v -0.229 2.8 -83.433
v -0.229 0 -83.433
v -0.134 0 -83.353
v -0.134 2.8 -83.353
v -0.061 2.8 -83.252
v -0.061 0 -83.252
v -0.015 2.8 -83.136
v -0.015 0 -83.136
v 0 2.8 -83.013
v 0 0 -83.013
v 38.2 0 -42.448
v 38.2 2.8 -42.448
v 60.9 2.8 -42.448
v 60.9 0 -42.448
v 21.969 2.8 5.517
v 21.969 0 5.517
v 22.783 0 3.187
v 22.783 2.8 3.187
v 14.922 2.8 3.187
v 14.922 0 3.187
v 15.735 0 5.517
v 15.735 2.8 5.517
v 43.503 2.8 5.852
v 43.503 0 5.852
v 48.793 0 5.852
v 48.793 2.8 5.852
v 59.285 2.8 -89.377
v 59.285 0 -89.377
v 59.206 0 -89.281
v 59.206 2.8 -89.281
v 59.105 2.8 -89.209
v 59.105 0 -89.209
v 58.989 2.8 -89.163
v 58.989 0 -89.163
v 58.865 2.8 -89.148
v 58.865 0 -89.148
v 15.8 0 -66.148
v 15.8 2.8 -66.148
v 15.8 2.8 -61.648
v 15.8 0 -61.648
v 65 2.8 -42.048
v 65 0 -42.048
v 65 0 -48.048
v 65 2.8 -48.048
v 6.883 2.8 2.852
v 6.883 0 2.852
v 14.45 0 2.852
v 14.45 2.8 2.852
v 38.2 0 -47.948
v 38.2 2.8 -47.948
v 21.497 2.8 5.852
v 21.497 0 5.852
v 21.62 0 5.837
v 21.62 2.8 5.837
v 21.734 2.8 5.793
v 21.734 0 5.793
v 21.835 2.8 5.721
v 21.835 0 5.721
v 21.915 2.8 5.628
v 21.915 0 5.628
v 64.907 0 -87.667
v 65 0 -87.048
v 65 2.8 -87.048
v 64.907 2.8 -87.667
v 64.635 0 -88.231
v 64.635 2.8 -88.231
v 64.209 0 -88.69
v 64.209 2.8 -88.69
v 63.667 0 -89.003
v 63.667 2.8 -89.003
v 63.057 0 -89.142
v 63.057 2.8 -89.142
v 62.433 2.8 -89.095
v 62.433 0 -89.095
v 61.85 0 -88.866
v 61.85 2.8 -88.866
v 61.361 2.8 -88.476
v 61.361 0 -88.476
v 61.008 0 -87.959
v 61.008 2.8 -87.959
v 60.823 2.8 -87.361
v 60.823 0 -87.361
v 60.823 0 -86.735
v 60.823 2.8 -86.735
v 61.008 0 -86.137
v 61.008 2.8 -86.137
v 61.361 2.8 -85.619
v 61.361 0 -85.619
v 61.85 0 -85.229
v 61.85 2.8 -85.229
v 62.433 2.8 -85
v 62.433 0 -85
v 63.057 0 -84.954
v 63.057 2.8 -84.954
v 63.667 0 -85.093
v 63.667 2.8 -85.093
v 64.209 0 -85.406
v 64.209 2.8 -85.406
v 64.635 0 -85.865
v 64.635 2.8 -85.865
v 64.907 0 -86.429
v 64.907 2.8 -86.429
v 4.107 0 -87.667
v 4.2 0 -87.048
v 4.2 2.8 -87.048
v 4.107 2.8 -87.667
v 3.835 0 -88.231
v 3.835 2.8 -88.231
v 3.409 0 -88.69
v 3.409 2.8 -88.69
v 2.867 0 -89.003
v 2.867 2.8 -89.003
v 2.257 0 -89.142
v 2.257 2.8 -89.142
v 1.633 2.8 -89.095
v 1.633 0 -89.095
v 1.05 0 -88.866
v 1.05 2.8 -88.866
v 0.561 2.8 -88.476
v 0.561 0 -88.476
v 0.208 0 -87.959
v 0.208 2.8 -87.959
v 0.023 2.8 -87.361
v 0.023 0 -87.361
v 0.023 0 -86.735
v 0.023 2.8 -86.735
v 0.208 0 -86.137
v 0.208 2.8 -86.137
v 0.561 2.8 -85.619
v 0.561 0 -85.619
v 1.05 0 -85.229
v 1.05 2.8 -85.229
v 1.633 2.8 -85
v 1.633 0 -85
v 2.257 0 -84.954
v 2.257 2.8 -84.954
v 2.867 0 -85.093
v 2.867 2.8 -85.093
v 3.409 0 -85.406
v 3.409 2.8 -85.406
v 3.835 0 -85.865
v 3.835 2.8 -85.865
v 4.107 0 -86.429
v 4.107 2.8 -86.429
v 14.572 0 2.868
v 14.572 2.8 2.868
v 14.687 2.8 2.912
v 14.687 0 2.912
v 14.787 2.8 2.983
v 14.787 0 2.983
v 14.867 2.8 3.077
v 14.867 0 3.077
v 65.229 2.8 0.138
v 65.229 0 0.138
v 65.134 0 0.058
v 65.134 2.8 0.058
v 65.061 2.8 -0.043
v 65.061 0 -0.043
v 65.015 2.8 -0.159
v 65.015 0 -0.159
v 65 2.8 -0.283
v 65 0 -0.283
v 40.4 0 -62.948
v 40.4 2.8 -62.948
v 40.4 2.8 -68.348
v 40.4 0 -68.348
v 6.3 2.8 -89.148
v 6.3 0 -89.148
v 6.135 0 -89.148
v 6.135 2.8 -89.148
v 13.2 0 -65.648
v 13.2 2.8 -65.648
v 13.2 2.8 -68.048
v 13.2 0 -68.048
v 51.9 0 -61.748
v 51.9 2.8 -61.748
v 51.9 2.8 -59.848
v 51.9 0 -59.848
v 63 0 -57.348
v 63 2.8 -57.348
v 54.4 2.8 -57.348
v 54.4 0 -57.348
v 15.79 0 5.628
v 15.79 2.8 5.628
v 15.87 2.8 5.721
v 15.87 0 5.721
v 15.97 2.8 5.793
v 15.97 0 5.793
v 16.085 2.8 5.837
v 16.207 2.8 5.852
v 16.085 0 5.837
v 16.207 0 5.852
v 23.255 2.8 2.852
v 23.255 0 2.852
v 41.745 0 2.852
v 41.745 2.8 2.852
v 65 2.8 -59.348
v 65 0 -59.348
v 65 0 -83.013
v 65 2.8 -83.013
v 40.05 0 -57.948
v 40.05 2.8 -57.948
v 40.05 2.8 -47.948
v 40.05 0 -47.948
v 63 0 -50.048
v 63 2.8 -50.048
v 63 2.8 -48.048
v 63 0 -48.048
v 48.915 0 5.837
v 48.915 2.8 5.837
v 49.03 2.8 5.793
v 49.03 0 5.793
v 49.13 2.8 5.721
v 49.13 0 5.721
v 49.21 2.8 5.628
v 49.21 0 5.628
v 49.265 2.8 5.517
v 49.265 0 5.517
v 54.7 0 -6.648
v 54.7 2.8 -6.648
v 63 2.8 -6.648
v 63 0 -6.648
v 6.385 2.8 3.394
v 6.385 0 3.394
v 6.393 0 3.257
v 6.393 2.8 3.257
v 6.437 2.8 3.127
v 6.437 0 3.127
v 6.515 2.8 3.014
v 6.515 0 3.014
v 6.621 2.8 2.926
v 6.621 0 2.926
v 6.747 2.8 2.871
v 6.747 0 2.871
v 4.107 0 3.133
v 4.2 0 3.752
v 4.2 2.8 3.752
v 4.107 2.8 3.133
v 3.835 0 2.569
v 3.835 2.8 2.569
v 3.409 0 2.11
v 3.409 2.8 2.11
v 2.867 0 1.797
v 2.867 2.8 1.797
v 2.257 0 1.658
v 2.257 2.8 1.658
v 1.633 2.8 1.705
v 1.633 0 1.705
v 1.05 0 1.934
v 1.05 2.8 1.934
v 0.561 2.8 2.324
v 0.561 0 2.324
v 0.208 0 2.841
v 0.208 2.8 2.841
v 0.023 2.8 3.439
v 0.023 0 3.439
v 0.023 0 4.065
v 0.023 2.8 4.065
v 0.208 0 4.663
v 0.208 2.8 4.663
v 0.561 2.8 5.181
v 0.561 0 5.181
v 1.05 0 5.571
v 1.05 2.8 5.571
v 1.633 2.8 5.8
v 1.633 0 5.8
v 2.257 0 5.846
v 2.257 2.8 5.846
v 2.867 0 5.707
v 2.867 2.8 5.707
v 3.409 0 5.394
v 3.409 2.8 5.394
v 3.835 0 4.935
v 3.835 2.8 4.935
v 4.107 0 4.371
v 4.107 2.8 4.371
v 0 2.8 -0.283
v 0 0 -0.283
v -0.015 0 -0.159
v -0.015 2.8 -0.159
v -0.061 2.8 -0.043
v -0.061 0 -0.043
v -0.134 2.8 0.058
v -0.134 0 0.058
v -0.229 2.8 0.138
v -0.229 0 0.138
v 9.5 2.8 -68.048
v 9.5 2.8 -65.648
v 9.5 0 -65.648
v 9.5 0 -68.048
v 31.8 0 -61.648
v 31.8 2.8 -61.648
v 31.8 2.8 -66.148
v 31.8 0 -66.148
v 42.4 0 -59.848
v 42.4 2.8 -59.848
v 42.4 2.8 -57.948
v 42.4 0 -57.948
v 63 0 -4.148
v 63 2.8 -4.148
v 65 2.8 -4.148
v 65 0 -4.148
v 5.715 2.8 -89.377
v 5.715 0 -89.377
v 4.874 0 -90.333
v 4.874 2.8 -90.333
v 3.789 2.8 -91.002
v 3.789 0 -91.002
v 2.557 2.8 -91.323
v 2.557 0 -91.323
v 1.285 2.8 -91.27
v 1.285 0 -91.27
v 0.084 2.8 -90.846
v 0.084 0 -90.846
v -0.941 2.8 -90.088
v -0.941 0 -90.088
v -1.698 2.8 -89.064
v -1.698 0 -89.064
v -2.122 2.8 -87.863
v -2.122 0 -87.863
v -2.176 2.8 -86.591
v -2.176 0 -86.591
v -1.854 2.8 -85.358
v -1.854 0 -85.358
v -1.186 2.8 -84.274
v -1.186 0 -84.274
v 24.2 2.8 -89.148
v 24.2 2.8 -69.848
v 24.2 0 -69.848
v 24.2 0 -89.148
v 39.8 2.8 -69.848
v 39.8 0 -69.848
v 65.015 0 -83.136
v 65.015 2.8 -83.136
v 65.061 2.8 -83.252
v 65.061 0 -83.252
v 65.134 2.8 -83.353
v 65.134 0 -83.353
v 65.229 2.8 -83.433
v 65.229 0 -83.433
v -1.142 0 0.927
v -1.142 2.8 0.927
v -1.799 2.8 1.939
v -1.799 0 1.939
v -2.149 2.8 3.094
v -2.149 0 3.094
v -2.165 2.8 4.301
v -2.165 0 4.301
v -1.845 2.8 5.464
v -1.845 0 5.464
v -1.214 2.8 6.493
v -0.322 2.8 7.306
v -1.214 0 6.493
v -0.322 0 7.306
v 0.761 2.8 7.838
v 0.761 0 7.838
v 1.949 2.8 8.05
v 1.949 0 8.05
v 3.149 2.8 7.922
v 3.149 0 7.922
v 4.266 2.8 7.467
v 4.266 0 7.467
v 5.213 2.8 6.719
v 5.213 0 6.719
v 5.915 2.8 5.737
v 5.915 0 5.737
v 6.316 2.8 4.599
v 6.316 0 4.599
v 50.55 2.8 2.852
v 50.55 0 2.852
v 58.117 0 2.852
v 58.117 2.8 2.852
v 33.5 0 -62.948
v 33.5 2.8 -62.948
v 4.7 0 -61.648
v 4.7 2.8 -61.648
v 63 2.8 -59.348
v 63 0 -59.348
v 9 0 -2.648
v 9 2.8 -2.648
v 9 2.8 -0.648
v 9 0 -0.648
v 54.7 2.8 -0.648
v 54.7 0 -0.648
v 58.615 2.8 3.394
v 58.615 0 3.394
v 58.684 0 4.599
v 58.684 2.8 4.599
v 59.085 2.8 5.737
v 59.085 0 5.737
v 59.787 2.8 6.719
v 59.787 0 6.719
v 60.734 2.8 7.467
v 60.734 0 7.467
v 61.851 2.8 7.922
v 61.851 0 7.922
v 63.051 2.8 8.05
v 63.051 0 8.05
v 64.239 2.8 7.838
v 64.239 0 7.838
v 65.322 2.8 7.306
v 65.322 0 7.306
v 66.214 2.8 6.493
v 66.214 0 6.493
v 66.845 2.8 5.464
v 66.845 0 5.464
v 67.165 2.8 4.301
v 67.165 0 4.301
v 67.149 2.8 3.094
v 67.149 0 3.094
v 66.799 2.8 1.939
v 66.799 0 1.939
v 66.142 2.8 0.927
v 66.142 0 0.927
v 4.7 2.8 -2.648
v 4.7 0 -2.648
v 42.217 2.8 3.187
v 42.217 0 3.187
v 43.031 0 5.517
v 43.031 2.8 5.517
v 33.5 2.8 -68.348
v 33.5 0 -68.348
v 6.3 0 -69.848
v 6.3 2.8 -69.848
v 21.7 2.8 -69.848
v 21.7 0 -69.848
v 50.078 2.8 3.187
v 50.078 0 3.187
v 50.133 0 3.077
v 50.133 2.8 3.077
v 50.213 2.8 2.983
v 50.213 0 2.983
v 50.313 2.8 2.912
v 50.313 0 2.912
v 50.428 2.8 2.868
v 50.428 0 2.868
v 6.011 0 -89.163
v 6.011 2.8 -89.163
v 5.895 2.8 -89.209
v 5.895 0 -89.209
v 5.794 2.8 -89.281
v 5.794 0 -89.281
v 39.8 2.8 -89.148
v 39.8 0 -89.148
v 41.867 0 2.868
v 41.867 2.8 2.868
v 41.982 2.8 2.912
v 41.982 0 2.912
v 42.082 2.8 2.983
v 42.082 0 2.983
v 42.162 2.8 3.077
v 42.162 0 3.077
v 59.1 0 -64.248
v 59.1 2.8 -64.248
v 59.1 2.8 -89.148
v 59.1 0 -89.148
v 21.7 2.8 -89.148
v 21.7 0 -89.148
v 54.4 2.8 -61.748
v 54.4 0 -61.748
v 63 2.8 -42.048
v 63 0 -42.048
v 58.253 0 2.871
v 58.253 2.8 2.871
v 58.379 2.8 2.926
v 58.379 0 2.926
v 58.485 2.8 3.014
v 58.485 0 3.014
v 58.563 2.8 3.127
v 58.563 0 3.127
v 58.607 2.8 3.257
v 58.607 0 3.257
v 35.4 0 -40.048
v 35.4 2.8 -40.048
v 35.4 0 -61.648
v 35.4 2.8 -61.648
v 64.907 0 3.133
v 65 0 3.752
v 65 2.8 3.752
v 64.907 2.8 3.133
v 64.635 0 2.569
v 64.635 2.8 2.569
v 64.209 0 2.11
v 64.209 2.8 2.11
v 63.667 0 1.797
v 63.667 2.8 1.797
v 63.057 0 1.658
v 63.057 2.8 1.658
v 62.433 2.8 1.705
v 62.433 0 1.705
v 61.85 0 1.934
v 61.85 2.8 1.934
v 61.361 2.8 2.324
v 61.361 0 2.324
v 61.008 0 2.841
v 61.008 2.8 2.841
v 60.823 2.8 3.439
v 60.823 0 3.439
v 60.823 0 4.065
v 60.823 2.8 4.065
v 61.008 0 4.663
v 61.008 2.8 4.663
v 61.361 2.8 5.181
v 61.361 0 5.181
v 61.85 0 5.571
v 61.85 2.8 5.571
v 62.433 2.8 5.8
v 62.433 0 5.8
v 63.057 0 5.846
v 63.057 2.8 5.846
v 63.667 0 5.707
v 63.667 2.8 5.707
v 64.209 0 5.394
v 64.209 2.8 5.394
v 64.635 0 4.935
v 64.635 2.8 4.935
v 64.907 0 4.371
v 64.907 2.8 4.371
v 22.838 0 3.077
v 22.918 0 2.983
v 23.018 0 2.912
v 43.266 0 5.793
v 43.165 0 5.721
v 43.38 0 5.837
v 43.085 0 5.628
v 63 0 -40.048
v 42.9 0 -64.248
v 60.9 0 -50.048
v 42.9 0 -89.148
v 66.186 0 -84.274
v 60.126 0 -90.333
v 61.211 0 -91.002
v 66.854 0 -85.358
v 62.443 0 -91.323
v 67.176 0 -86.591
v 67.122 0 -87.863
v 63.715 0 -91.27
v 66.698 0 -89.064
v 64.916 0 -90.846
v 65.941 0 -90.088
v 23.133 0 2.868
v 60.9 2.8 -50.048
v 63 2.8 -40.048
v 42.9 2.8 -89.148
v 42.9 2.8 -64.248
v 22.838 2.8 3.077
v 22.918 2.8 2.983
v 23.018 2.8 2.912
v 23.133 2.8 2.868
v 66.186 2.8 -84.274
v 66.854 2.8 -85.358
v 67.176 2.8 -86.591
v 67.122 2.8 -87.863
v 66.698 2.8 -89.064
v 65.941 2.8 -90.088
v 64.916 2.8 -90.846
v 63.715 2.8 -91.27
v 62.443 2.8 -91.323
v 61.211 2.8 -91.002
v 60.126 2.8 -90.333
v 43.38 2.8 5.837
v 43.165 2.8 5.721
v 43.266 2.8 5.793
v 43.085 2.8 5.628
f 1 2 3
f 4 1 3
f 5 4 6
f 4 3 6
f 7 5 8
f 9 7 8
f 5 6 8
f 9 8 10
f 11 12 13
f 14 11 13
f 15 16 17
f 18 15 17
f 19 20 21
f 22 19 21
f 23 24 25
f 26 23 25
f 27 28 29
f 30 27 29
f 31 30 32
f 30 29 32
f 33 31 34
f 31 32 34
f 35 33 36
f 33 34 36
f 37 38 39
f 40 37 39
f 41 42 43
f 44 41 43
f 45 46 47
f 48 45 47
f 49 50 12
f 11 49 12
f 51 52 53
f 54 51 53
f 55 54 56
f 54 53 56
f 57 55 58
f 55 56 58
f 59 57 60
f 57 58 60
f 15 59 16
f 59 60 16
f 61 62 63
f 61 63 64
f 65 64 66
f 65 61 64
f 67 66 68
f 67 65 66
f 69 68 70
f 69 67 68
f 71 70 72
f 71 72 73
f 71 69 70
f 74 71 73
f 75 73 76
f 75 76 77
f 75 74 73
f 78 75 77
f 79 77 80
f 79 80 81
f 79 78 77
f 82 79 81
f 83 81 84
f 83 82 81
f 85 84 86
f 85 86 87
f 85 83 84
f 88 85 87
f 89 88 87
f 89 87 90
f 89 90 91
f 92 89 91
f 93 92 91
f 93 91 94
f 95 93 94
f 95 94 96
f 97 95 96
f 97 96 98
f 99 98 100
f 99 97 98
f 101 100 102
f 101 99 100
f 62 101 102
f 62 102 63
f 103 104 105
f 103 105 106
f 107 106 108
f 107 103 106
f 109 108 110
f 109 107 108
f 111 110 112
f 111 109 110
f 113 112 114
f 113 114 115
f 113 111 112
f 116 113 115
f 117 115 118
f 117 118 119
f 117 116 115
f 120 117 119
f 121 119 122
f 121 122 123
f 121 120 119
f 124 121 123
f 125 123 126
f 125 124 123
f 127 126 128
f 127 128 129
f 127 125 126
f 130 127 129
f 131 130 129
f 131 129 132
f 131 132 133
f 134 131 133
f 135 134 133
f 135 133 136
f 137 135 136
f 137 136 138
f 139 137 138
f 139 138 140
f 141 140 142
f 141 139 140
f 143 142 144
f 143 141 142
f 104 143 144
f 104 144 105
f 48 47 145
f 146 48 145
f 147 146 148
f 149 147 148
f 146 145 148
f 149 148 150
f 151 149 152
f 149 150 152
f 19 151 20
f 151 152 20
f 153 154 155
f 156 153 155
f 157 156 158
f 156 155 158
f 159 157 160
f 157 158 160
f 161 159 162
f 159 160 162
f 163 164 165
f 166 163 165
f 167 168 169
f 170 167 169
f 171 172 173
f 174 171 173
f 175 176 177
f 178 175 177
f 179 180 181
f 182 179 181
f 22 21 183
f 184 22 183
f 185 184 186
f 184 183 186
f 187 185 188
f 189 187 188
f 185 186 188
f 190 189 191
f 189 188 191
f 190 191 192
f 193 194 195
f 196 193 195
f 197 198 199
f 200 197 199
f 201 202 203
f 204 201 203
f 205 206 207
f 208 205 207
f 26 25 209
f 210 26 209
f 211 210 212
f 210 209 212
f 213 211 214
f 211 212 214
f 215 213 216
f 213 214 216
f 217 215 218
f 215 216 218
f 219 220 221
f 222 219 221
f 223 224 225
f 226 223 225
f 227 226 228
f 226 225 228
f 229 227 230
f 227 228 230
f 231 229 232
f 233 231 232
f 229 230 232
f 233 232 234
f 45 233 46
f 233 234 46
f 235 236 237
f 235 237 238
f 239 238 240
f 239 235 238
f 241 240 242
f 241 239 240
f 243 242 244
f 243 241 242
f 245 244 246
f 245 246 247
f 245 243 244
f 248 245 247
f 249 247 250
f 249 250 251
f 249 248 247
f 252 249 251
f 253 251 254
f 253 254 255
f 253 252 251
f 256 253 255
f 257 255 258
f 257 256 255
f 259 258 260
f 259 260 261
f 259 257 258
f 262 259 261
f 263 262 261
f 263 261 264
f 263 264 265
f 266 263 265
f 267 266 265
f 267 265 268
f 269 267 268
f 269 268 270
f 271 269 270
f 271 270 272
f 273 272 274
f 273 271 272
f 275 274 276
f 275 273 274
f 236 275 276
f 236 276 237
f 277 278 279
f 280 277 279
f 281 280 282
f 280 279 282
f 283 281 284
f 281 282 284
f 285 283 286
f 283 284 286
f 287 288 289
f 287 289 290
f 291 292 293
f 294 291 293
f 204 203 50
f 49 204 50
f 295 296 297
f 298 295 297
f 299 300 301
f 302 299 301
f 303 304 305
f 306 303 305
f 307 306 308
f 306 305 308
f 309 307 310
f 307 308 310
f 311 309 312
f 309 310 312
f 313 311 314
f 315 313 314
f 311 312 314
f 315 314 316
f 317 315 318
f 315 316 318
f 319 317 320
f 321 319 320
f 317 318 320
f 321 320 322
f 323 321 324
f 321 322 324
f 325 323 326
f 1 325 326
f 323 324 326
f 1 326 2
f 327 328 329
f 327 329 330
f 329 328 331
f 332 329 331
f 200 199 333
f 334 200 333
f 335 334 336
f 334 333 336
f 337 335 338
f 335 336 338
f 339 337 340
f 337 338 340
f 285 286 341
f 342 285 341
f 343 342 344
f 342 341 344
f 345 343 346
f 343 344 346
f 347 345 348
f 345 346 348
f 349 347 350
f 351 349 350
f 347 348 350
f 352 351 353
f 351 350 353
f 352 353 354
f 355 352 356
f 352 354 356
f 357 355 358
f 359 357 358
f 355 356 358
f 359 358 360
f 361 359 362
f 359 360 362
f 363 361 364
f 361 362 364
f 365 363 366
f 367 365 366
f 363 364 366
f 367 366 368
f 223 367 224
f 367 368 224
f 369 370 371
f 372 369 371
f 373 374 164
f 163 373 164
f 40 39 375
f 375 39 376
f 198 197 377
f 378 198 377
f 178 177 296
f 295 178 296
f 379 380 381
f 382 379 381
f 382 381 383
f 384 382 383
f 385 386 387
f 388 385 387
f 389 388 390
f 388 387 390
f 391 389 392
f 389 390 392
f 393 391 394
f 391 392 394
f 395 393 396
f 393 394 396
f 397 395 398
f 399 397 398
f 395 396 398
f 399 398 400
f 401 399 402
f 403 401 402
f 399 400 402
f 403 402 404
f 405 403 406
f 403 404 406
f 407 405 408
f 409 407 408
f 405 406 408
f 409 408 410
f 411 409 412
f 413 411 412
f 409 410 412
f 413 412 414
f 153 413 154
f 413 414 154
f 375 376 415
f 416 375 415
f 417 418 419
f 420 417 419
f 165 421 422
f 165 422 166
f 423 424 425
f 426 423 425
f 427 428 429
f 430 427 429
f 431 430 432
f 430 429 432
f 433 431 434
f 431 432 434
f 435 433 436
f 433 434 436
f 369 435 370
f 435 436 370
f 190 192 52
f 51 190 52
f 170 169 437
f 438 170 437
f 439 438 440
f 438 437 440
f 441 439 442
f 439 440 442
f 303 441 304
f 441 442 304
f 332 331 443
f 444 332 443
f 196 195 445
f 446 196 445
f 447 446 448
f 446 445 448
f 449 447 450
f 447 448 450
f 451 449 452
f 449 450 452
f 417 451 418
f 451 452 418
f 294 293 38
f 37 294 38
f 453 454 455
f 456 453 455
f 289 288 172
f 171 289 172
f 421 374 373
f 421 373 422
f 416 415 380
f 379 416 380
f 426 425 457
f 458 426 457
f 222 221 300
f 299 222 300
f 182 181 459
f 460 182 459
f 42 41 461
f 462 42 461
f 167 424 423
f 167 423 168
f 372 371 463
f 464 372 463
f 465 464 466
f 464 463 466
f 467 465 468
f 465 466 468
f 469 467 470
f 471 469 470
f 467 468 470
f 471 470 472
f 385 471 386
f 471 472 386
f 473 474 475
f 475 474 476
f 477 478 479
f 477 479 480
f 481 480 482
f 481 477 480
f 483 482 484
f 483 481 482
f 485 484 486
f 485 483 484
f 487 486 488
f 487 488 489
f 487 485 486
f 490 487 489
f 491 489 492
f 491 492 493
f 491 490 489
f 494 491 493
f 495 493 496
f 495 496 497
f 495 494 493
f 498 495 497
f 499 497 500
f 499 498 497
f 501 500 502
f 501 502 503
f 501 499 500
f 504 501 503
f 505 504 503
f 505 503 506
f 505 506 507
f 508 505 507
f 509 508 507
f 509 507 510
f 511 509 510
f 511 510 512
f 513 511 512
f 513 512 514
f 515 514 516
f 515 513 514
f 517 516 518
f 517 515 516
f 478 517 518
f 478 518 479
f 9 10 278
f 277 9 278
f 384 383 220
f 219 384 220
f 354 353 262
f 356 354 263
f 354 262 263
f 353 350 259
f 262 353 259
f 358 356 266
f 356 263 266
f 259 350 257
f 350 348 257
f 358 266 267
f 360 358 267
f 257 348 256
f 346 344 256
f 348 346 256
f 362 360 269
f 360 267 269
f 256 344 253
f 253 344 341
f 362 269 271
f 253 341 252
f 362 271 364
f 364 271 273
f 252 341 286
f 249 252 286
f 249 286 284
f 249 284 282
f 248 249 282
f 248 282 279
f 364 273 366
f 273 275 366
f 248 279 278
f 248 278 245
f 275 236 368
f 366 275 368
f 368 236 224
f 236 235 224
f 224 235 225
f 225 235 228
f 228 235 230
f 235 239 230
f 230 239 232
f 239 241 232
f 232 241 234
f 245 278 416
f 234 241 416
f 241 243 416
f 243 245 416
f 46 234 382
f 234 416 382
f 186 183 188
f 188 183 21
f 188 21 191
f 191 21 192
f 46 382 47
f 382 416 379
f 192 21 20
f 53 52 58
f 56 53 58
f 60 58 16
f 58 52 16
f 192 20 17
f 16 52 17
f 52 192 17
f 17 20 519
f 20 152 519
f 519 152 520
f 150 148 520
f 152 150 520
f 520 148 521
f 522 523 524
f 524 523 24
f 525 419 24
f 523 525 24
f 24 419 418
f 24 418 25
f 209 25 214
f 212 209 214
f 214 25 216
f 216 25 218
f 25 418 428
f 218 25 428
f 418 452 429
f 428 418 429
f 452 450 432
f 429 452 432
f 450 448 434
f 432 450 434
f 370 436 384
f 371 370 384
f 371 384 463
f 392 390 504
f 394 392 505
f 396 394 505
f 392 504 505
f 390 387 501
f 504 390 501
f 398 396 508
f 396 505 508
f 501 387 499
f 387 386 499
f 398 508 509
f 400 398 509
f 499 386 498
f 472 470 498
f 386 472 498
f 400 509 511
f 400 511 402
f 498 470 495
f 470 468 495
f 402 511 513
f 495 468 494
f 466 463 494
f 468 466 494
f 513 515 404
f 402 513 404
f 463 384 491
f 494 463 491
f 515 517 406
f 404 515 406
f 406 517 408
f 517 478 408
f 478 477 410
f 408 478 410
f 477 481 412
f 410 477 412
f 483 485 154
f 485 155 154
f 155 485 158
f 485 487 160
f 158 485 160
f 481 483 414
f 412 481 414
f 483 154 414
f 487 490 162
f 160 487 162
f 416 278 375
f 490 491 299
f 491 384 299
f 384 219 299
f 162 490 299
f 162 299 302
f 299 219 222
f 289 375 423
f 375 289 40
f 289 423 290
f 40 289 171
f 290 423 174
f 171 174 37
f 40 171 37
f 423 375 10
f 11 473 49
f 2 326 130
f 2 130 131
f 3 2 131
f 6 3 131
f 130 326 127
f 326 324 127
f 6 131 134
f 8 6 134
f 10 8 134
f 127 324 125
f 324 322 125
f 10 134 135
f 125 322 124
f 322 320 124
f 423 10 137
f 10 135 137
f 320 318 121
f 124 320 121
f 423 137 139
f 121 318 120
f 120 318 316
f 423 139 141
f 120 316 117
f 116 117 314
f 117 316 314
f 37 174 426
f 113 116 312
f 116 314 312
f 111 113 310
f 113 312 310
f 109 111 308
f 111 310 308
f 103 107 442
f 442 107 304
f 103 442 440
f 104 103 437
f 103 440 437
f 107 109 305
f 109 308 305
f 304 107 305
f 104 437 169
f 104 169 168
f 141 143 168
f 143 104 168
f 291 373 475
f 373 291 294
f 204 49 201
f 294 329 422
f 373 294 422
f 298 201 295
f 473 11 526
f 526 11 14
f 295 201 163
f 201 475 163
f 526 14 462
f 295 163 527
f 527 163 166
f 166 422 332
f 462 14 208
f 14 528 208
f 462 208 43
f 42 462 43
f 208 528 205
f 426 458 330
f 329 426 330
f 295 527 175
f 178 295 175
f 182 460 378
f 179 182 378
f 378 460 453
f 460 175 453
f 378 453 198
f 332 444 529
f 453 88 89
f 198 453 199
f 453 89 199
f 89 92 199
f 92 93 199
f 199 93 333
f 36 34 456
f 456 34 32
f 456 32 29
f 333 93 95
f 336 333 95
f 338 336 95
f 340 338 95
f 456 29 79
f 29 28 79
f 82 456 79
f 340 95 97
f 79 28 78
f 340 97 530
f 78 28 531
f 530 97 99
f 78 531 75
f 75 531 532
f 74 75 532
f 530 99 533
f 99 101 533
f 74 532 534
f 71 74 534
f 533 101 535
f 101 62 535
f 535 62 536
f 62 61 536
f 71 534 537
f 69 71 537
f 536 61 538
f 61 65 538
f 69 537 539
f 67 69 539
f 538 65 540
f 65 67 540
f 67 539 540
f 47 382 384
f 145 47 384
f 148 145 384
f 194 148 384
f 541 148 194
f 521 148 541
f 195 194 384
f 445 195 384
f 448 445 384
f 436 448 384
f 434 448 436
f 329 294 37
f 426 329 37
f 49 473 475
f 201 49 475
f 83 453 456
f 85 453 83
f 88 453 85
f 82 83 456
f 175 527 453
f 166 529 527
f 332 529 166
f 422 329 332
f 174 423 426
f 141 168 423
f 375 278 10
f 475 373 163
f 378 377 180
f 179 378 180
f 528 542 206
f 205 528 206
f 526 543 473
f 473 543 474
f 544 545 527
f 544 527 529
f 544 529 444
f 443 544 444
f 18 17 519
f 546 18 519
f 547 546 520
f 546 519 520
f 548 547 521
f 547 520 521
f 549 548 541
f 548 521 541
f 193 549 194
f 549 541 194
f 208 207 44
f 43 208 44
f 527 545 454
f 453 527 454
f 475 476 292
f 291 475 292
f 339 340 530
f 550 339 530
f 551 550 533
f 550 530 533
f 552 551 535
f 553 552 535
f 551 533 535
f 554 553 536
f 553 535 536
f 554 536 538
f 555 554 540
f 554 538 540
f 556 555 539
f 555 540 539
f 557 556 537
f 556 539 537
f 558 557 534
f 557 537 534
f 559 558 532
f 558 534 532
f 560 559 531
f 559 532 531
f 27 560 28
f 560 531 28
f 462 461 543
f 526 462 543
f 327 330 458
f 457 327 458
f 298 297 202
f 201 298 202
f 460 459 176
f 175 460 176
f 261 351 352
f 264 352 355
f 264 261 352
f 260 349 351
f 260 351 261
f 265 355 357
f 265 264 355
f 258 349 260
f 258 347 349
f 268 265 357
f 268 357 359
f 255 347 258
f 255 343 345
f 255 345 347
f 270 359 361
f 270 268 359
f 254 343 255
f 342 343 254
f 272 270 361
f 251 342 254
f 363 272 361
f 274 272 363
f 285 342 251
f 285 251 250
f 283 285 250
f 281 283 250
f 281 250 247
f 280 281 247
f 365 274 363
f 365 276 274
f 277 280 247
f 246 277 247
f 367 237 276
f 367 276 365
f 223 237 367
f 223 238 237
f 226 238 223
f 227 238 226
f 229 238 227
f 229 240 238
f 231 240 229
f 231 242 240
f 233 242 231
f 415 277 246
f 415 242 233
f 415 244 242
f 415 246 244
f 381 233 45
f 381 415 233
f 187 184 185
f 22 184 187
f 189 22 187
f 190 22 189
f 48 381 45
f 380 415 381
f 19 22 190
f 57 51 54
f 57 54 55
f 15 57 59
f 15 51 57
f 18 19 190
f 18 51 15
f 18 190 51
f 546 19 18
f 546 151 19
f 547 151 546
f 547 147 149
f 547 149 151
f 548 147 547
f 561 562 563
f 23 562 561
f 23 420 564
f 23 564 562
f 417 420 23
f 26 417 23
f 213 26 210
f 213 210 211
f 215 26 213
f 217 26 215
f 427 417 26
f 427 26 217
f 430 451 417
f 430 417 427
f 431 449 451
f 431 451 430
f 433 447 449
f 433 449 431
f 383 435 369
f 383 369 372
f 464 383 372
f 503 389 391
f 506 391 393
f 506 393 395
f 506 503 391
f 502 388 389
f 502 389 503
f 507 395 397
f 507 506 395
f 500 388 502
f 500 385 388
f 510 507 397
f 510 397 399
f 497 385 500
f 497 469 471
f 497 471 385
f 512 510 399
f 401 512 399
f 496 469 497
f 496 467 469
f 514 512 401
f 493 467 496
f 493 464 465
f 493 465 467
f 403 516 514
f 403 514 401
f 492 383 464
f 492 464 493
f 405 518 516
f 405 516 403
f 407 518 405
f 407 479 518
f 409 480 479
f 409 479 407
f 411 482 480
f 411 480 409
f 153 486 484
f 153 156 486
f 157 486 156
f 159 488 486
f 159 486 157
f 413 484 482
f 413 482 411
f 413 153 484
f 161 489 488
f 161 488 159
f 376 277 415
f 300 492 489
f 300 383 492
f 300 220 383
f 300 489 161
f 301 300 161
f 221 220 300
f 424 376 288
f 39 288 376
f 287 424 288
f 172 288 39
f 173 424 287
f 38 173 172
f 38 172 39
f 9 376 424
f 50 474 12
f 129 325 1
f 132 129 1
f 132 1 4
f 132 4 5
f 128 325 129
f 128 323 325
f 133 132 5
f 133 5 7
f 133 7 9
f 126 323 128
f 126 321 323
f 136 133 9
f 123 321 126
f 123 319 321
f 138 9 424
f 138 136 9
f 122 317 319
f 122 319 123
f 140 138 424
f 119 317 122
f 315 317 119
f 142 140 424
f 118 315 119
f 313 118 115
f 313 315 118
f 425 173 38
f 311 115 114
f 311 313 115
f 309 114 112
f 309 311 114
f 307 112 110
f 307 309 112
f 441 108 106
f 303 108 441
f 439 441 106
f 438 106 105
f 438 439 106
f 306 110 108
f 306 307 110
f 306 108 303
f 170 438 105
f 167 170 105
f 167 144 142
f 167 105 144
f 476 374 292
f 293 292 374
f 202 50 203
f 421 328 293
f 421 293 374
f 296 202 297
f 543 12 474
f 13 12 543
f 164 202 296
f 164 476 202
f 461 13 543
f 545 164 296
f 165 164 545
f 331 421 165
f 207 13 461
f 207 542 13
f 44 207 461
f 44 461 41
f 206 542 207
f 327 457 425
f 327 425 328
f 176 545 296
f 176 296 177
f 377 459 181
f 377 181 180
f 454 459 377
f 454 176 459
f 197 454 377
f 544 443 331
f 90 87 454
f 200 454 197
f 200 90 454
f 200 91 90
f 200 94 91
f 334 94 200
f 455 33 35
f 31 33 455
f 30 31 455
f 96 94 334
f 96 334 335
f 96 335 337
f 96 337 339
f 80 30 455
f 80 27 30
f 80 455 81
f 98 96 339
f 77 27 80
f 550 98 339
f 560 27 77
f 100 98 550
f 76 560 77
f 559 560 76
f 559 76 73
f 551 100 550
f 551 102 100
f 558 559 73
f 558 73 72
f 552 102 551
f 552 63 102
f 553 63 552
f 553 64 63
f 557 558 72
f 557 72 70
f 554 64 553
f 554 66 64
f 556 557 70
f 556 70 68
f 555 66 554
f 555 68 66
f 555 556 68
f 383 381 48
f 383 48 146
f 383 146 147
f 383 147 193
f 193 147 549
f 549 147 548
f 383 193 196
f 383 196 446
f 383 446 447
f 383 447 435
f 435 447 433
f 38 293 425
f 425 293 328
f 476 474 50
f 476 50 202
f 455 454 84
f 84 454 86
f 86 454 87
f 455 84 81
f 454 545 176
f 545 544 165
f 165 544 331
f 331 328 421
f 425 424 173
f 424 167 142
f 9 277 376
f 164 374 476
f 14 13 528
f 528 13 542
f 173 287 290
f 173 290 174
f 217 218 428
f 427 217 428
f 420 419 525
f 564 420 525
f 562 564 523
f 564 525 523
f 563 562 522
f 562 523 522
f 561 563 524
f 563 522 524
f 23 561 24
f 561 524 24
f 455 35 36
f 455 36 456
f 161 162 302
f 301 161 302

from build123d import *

# Parameters (mm, degrees)
BASEPLATE_OUTLINE_R = 2.1
BASEPLATE_DEPTH     = 2.8
CUT_EXTRUDE1_REACH  = 115.438
SKETCH3_W           = 15.4
SKETCH3_H           = 19.3
SKETCH3_W_2         = 15.6
SKETCH3_W_3         = 16.2
SKETCH3_H_2         = 24.9
SKETCH3_W_4         = 3.7
SKETCH3_H_3         = 2.4
CUT_EXTRUDE2_REACH  = 115.438
SKETCH4_W           = 6.9
SKETCH4_H           = 5.4


# Read off the part's stored shape, not the designer's step: BasePlate
with BuildPart() as part:
    # BasePlate outline → BasePlate (new body)
    with BuildSketch(Plane(origin=(0, 0, 0), x_dir=(1, 0, 0), z_dir=(0, 1, 0))):
        with BuildLine():
            Line((43.502626614, -5.852332608), (48.792614178, -5.852332608))
            ThreePointArc((48.792614178, -5.852332608), (49.082078508, -5.760021707), (49.264659986, -5.517174213))
            Line((49.264659986, -5.517174213), (50.078201202, -3.187491002))
            ThreePointArc((50.078201202, -3.187491002), (50.26078268, -2.944643509), (50.55024701, -2.852332608))
            Line((50.55024701, -2.852332608), (58.116695703, -2.852332608))
            ThreePointArc((58.116695703, -2.852332608), (58.484685739, -3.013831008), (58.614956567, -3.393999275))
            ThreePointArc((58.614956567, -3.393999275), (64.799237397, -7.61016844), (65.229166667, -0.137781095))
            ThreePointArc((65.229166667, -0.137781095), (65.061014427, 0.043158816), (65, 0.282515593))
            Line((65, 0.282515593), (65, 83.012819192))
            ThreePointArc((65, 83.012819192), (65.061014427, 83.252175969), (65.229166667, 83.433115879))
            ThreePointArc((65.229166667, 83.433115879), (65.940559159, 90.088226551), (59.285448487, 89.376834059))
            ThreePointArc((59.285448487, 89.376834059), (59.104508577, 89.208681819), (58.8651518, 89.147667392))
            Line((58.8651518, 89.147667392), (6.1348482, 89.147667392))
            ThreePointArc((6.1348482, 89.147667392), (5.895491423, 89.208681819), (5.714551513, 89.376834059))
            ThreePointArc((5.714551513, 89.376834059), (-0.940559159, 90.088226551), (-0.229166667, 83.433115879))
            ThreePointArc((-0.229166667, 83.433115879), (-0.061014427, 83.252175969), (0, 83.012819192))
            Line((0, 83.012819192), (0, 0.282515593))
            ThreePointArc((0, 0.282515593), (-0.061014427, 0.043158816), (-0.229166667, -0.137781095))
            ThreePointArc((-0.229166667, -0.137781095), (0.200762603, -7.61016844), (6.385043433, -3.393999275))
            ThreePointArc((6.385043433, -3.393999275), (6.515314261, -3.013831008), (6.883304297, -2.852332608))
            Line((6.883304297, -2.852332608), (14.44975299, -2.852332608))
            ThreePointArc((14.44975299, -2.852332608), (14.73921732, -2.944643509), (14.921798798, -3.187491002))
            Line((14.921798798, -3.187491002), (15.735340014, -5.517174213))
            ThreePointArc((15.735340014, -5.517174213), (15.917921492, -5.760021707), (16.207385822, -5.852332608))
            Line((16.207385822, -5.852332608), (21.497373386, -5.852332608))
            ThreePointArc((21.497373386, -5.852332608), (21.786837716, -5.760021707), (21.969419194, -5.517174213))
            Line((21.969419194, -5.517174213), (22.78296041, -3.187491002))
            ThreePointArc((22.78296041, -3.187491002), (22.965541888, -2.944643509), (23.255006218, -2.852332608))
            Line((23.255006218, -2.852332608), (41.744993782, -2.852332608))
            ThreePointArc((41.744993782, -2.852332608), (42.034458112, -2.944643509), (42.21703959, -3.187491002))
            Line((42.21703959, -3.187491002), (43.030580806, -5.517174213))
            ThreePointArc((43.030580806, -5.517174213), (43.213162284, -5.760021707), (43.502626614, -5.852332608))
        make_face()
        with Locations((2.1, -3.752332608)):
            Circle(BASEPLATE_OUTLINE_R, mode=Mode.SUBTRACT)
        with Locations((62.9, -3.752332608)):
            Circle(BASEPLATE_OUTLINE_R, mode=Mode.SUBTRACT)
        with Locations((2.1, 87.047667392)):
            Circle(BASEPLATE_OUTLINE_R, mode=Mode.SUBTRACT)
        with Locations((62.9, 87.047667392)):
            Circle(BASEPLATE_OUTLINE_R, mode=Mode.SUBTRACT)
    extrude(amount=BASEPLATE_DEPTH)

    # Sketch3 → Cut-Extrude1 (cut, up to next)
    with BuildSketch(Plane(origin=(0, 2.8, 0), x_dir=(1, 0, 0), z_dir=(0, 1, 0)), mode=Mode.PRIVATE) as cut_extrude1_sk1:
        Polygon((9, 0.647667392), (54.7, 0.647667392), (54.7, 6.647667392), (63, 6.647667392), (63, 4.147667392), (65, 4.147667392), (65, 42.047667392), (63, 42.047667392), (63, 40.047667392), (35.4, 40.047667392), (35.4, 61.647667392), (31.8, 61.647667392), (31.8, 66.147667392), (15.8, 66.147667392), (15.8, 61.647667392), (4.7, 61.647667392), (4.7, 2.647667392), (9, 2.647667392), align=None)
    cut_extrude1_tool1 = extrude(cut_extrude1_sk1.sketch, amount=-CUT_EXTRUDE1_REACH, mode=Mode.PRIVATE) & part.part
    # Sketch3 → Cut-Extrude1 (cut, up to next)
    with BuildSketch(Plane(origin=(0, 2.8, 0), x_dir=(1, 0, 0), z_dir=(0, 1, 0)), mode=Mode.PRIVATE) as cut_extrude1_sk2:
        with Locations((14, 79.497667392)):
            Rectangle(SKETCH3_W, SKETCH3_H)
    cut_extrude1_tool2 = extrude(cut_extrude1_sk2.sketch, amount=-CUT_EXTRUDE1_REACH, mode=Mode.PRIVATE) & part.part
    # Sketch3 → Cut-Extrude1 (cut, up to next)
    with BuildSketch(Plane(origin=(0, 2.8, 0), x_dir=(1, 0, 0), z_dir=(0, 1, 0)), mode=Mode.PRIVATE) as cut_extrude1_sk3:
        with Locations((32, 79.497667392)):
            Rectangle(SKETCH3_W_2, SKETCH3_H)
    cut_extrude1_tool3 = extrude(cut_extrude1_sk3.sketch, amount=-CUT_EXTRUDE1_REACH, mode=Mode.PRIVATE) & part.part
    # Sketch3 → Cut-Extrude1 (cut, up to next)
    with BuildSketch(Plane(origin=(0, 2.8, 0), x_dir=(1, 0, 0), z_dir=(0, 1, 0)), mode=Mode.PRIVATE) as cut_extrude1_sk4:
        with Locations((51, 76.697667392)):
            Rectangle(SKETCH3_W_3, SKETCH3_H_2)
    cut_extrude1_tool4 = extrude(cut_extrude1_sk4.sketch, amount=-CUT_EXTRUDE1_REACH, mode=Mode.PRIVATE) & part.part
    # Sketch3 → Cut-Extrude1 (cut, up to next)
    with BuildSketch(Plane(origin=(0, 2.8, 0), x_dir=(1, 0, 0), z_dir=(0, 1, 0)), mode=Mode.PRIVATE) as cut_extrude1_sk5:
        with Locations((11.35, 66.847667392)):
            Rectangle(SKETCH3_W_4, SKETCH3_H_3)
    cut_extrude1_tool5 = extrude(cut_extrude1_sk5.sketch, amount=-CUT_EXTRUDE1_REACH, mode=Mode.PRIVATE) & part.part
    add(cut_extrude1_tool1.solids().sort_by_distance((31.029219, 2.8, -28.401895))[0], mode=Mode.SUBTRACT)
    add(cut_extrude1_tool2.solids().sort_by_distance((14, 2.8, -79.497667))[0], mode=Mode.SUBTRACT)
    add(cut_extrude1_tool3.solids().sort_by_distance((32, 2.8, -79.497667))[0], mode=Mode.SUBTRACT)
    add(cut_extrude1_tool4.solids().sort_by_distance((51, 2.8, -76.697667))[0], mode=Mode.SUBTRACT)
    add(cut_extrude1_tool5.solids().sort_by_distance((11.35, 2.8, -66.847667))[0], mode=Mode.SUBTRACT)

    # Sketch4 → Cut-Extrude2 (cut, up to next)
    with BuildSketch(Plane(origin=(0, 2.8, 0), x_dir=(1, 0, 0), z_dir=(0, 1, 0)), mode=Mode.PRIVATE) as cut_extrude2_sk1:
        Polygon((65, 59.347667392), (63, 59.347667392), (63, 57.347667392), (54.4, 57.347667392), (54.4, 61.747667392), (51.9, 61.747667392), (51.9, 59.847667392), (42.4, 59.847667392), (42.4, 57.947667392), (40.05, 57.947667392), (40.05, 47.947667392), (38.2, 47.947667392), (38.2, 42.447667392), (60.9, 42.447667392), (60.9, 50.047667392), (63, 50.047667392), (63, 48.047667392), (65, 48.047667392), align=None)
    cut_extrude2_tool1 = extrude(cut_extrude2_sk1.sketch, amount=-CUT_EXTRUDE2_REACH, mode=Mode.PRIVATE) & part.part
    # Sketch4 → Cut-Extrude2 (cut, up to next)
    with BuildSketch(Plane(origin=(0, 2.8, 0), x_dir=(1, 0, 0), z_dir=(0, 1, 0)), mode=Mode.PRIVATE) as cut_extrude2_sk2:
        with Locations((36.95, 65.647667392)):
            Rectangle(SKETCH4_W, SKETCH4_H)
    cut_extrude2_tool2 = extrude(cut_extrude2_sk2.sketch, amount=-CUT_EXTRUDE2_REACH, mode=Mode.PRIVATE) & part.part
    add(cut_extrude2_tool1.solids().sort_by_distance((51.243501, 2.8, -50.961182))[0], mode=Mode.SUBTRACT)
    add(cut_extrude2_tool2.solids().sort_by_distance((36.95, 2.8, -65.647667))[0], mode=Mode.SUBTRACT)


solid = part.part
